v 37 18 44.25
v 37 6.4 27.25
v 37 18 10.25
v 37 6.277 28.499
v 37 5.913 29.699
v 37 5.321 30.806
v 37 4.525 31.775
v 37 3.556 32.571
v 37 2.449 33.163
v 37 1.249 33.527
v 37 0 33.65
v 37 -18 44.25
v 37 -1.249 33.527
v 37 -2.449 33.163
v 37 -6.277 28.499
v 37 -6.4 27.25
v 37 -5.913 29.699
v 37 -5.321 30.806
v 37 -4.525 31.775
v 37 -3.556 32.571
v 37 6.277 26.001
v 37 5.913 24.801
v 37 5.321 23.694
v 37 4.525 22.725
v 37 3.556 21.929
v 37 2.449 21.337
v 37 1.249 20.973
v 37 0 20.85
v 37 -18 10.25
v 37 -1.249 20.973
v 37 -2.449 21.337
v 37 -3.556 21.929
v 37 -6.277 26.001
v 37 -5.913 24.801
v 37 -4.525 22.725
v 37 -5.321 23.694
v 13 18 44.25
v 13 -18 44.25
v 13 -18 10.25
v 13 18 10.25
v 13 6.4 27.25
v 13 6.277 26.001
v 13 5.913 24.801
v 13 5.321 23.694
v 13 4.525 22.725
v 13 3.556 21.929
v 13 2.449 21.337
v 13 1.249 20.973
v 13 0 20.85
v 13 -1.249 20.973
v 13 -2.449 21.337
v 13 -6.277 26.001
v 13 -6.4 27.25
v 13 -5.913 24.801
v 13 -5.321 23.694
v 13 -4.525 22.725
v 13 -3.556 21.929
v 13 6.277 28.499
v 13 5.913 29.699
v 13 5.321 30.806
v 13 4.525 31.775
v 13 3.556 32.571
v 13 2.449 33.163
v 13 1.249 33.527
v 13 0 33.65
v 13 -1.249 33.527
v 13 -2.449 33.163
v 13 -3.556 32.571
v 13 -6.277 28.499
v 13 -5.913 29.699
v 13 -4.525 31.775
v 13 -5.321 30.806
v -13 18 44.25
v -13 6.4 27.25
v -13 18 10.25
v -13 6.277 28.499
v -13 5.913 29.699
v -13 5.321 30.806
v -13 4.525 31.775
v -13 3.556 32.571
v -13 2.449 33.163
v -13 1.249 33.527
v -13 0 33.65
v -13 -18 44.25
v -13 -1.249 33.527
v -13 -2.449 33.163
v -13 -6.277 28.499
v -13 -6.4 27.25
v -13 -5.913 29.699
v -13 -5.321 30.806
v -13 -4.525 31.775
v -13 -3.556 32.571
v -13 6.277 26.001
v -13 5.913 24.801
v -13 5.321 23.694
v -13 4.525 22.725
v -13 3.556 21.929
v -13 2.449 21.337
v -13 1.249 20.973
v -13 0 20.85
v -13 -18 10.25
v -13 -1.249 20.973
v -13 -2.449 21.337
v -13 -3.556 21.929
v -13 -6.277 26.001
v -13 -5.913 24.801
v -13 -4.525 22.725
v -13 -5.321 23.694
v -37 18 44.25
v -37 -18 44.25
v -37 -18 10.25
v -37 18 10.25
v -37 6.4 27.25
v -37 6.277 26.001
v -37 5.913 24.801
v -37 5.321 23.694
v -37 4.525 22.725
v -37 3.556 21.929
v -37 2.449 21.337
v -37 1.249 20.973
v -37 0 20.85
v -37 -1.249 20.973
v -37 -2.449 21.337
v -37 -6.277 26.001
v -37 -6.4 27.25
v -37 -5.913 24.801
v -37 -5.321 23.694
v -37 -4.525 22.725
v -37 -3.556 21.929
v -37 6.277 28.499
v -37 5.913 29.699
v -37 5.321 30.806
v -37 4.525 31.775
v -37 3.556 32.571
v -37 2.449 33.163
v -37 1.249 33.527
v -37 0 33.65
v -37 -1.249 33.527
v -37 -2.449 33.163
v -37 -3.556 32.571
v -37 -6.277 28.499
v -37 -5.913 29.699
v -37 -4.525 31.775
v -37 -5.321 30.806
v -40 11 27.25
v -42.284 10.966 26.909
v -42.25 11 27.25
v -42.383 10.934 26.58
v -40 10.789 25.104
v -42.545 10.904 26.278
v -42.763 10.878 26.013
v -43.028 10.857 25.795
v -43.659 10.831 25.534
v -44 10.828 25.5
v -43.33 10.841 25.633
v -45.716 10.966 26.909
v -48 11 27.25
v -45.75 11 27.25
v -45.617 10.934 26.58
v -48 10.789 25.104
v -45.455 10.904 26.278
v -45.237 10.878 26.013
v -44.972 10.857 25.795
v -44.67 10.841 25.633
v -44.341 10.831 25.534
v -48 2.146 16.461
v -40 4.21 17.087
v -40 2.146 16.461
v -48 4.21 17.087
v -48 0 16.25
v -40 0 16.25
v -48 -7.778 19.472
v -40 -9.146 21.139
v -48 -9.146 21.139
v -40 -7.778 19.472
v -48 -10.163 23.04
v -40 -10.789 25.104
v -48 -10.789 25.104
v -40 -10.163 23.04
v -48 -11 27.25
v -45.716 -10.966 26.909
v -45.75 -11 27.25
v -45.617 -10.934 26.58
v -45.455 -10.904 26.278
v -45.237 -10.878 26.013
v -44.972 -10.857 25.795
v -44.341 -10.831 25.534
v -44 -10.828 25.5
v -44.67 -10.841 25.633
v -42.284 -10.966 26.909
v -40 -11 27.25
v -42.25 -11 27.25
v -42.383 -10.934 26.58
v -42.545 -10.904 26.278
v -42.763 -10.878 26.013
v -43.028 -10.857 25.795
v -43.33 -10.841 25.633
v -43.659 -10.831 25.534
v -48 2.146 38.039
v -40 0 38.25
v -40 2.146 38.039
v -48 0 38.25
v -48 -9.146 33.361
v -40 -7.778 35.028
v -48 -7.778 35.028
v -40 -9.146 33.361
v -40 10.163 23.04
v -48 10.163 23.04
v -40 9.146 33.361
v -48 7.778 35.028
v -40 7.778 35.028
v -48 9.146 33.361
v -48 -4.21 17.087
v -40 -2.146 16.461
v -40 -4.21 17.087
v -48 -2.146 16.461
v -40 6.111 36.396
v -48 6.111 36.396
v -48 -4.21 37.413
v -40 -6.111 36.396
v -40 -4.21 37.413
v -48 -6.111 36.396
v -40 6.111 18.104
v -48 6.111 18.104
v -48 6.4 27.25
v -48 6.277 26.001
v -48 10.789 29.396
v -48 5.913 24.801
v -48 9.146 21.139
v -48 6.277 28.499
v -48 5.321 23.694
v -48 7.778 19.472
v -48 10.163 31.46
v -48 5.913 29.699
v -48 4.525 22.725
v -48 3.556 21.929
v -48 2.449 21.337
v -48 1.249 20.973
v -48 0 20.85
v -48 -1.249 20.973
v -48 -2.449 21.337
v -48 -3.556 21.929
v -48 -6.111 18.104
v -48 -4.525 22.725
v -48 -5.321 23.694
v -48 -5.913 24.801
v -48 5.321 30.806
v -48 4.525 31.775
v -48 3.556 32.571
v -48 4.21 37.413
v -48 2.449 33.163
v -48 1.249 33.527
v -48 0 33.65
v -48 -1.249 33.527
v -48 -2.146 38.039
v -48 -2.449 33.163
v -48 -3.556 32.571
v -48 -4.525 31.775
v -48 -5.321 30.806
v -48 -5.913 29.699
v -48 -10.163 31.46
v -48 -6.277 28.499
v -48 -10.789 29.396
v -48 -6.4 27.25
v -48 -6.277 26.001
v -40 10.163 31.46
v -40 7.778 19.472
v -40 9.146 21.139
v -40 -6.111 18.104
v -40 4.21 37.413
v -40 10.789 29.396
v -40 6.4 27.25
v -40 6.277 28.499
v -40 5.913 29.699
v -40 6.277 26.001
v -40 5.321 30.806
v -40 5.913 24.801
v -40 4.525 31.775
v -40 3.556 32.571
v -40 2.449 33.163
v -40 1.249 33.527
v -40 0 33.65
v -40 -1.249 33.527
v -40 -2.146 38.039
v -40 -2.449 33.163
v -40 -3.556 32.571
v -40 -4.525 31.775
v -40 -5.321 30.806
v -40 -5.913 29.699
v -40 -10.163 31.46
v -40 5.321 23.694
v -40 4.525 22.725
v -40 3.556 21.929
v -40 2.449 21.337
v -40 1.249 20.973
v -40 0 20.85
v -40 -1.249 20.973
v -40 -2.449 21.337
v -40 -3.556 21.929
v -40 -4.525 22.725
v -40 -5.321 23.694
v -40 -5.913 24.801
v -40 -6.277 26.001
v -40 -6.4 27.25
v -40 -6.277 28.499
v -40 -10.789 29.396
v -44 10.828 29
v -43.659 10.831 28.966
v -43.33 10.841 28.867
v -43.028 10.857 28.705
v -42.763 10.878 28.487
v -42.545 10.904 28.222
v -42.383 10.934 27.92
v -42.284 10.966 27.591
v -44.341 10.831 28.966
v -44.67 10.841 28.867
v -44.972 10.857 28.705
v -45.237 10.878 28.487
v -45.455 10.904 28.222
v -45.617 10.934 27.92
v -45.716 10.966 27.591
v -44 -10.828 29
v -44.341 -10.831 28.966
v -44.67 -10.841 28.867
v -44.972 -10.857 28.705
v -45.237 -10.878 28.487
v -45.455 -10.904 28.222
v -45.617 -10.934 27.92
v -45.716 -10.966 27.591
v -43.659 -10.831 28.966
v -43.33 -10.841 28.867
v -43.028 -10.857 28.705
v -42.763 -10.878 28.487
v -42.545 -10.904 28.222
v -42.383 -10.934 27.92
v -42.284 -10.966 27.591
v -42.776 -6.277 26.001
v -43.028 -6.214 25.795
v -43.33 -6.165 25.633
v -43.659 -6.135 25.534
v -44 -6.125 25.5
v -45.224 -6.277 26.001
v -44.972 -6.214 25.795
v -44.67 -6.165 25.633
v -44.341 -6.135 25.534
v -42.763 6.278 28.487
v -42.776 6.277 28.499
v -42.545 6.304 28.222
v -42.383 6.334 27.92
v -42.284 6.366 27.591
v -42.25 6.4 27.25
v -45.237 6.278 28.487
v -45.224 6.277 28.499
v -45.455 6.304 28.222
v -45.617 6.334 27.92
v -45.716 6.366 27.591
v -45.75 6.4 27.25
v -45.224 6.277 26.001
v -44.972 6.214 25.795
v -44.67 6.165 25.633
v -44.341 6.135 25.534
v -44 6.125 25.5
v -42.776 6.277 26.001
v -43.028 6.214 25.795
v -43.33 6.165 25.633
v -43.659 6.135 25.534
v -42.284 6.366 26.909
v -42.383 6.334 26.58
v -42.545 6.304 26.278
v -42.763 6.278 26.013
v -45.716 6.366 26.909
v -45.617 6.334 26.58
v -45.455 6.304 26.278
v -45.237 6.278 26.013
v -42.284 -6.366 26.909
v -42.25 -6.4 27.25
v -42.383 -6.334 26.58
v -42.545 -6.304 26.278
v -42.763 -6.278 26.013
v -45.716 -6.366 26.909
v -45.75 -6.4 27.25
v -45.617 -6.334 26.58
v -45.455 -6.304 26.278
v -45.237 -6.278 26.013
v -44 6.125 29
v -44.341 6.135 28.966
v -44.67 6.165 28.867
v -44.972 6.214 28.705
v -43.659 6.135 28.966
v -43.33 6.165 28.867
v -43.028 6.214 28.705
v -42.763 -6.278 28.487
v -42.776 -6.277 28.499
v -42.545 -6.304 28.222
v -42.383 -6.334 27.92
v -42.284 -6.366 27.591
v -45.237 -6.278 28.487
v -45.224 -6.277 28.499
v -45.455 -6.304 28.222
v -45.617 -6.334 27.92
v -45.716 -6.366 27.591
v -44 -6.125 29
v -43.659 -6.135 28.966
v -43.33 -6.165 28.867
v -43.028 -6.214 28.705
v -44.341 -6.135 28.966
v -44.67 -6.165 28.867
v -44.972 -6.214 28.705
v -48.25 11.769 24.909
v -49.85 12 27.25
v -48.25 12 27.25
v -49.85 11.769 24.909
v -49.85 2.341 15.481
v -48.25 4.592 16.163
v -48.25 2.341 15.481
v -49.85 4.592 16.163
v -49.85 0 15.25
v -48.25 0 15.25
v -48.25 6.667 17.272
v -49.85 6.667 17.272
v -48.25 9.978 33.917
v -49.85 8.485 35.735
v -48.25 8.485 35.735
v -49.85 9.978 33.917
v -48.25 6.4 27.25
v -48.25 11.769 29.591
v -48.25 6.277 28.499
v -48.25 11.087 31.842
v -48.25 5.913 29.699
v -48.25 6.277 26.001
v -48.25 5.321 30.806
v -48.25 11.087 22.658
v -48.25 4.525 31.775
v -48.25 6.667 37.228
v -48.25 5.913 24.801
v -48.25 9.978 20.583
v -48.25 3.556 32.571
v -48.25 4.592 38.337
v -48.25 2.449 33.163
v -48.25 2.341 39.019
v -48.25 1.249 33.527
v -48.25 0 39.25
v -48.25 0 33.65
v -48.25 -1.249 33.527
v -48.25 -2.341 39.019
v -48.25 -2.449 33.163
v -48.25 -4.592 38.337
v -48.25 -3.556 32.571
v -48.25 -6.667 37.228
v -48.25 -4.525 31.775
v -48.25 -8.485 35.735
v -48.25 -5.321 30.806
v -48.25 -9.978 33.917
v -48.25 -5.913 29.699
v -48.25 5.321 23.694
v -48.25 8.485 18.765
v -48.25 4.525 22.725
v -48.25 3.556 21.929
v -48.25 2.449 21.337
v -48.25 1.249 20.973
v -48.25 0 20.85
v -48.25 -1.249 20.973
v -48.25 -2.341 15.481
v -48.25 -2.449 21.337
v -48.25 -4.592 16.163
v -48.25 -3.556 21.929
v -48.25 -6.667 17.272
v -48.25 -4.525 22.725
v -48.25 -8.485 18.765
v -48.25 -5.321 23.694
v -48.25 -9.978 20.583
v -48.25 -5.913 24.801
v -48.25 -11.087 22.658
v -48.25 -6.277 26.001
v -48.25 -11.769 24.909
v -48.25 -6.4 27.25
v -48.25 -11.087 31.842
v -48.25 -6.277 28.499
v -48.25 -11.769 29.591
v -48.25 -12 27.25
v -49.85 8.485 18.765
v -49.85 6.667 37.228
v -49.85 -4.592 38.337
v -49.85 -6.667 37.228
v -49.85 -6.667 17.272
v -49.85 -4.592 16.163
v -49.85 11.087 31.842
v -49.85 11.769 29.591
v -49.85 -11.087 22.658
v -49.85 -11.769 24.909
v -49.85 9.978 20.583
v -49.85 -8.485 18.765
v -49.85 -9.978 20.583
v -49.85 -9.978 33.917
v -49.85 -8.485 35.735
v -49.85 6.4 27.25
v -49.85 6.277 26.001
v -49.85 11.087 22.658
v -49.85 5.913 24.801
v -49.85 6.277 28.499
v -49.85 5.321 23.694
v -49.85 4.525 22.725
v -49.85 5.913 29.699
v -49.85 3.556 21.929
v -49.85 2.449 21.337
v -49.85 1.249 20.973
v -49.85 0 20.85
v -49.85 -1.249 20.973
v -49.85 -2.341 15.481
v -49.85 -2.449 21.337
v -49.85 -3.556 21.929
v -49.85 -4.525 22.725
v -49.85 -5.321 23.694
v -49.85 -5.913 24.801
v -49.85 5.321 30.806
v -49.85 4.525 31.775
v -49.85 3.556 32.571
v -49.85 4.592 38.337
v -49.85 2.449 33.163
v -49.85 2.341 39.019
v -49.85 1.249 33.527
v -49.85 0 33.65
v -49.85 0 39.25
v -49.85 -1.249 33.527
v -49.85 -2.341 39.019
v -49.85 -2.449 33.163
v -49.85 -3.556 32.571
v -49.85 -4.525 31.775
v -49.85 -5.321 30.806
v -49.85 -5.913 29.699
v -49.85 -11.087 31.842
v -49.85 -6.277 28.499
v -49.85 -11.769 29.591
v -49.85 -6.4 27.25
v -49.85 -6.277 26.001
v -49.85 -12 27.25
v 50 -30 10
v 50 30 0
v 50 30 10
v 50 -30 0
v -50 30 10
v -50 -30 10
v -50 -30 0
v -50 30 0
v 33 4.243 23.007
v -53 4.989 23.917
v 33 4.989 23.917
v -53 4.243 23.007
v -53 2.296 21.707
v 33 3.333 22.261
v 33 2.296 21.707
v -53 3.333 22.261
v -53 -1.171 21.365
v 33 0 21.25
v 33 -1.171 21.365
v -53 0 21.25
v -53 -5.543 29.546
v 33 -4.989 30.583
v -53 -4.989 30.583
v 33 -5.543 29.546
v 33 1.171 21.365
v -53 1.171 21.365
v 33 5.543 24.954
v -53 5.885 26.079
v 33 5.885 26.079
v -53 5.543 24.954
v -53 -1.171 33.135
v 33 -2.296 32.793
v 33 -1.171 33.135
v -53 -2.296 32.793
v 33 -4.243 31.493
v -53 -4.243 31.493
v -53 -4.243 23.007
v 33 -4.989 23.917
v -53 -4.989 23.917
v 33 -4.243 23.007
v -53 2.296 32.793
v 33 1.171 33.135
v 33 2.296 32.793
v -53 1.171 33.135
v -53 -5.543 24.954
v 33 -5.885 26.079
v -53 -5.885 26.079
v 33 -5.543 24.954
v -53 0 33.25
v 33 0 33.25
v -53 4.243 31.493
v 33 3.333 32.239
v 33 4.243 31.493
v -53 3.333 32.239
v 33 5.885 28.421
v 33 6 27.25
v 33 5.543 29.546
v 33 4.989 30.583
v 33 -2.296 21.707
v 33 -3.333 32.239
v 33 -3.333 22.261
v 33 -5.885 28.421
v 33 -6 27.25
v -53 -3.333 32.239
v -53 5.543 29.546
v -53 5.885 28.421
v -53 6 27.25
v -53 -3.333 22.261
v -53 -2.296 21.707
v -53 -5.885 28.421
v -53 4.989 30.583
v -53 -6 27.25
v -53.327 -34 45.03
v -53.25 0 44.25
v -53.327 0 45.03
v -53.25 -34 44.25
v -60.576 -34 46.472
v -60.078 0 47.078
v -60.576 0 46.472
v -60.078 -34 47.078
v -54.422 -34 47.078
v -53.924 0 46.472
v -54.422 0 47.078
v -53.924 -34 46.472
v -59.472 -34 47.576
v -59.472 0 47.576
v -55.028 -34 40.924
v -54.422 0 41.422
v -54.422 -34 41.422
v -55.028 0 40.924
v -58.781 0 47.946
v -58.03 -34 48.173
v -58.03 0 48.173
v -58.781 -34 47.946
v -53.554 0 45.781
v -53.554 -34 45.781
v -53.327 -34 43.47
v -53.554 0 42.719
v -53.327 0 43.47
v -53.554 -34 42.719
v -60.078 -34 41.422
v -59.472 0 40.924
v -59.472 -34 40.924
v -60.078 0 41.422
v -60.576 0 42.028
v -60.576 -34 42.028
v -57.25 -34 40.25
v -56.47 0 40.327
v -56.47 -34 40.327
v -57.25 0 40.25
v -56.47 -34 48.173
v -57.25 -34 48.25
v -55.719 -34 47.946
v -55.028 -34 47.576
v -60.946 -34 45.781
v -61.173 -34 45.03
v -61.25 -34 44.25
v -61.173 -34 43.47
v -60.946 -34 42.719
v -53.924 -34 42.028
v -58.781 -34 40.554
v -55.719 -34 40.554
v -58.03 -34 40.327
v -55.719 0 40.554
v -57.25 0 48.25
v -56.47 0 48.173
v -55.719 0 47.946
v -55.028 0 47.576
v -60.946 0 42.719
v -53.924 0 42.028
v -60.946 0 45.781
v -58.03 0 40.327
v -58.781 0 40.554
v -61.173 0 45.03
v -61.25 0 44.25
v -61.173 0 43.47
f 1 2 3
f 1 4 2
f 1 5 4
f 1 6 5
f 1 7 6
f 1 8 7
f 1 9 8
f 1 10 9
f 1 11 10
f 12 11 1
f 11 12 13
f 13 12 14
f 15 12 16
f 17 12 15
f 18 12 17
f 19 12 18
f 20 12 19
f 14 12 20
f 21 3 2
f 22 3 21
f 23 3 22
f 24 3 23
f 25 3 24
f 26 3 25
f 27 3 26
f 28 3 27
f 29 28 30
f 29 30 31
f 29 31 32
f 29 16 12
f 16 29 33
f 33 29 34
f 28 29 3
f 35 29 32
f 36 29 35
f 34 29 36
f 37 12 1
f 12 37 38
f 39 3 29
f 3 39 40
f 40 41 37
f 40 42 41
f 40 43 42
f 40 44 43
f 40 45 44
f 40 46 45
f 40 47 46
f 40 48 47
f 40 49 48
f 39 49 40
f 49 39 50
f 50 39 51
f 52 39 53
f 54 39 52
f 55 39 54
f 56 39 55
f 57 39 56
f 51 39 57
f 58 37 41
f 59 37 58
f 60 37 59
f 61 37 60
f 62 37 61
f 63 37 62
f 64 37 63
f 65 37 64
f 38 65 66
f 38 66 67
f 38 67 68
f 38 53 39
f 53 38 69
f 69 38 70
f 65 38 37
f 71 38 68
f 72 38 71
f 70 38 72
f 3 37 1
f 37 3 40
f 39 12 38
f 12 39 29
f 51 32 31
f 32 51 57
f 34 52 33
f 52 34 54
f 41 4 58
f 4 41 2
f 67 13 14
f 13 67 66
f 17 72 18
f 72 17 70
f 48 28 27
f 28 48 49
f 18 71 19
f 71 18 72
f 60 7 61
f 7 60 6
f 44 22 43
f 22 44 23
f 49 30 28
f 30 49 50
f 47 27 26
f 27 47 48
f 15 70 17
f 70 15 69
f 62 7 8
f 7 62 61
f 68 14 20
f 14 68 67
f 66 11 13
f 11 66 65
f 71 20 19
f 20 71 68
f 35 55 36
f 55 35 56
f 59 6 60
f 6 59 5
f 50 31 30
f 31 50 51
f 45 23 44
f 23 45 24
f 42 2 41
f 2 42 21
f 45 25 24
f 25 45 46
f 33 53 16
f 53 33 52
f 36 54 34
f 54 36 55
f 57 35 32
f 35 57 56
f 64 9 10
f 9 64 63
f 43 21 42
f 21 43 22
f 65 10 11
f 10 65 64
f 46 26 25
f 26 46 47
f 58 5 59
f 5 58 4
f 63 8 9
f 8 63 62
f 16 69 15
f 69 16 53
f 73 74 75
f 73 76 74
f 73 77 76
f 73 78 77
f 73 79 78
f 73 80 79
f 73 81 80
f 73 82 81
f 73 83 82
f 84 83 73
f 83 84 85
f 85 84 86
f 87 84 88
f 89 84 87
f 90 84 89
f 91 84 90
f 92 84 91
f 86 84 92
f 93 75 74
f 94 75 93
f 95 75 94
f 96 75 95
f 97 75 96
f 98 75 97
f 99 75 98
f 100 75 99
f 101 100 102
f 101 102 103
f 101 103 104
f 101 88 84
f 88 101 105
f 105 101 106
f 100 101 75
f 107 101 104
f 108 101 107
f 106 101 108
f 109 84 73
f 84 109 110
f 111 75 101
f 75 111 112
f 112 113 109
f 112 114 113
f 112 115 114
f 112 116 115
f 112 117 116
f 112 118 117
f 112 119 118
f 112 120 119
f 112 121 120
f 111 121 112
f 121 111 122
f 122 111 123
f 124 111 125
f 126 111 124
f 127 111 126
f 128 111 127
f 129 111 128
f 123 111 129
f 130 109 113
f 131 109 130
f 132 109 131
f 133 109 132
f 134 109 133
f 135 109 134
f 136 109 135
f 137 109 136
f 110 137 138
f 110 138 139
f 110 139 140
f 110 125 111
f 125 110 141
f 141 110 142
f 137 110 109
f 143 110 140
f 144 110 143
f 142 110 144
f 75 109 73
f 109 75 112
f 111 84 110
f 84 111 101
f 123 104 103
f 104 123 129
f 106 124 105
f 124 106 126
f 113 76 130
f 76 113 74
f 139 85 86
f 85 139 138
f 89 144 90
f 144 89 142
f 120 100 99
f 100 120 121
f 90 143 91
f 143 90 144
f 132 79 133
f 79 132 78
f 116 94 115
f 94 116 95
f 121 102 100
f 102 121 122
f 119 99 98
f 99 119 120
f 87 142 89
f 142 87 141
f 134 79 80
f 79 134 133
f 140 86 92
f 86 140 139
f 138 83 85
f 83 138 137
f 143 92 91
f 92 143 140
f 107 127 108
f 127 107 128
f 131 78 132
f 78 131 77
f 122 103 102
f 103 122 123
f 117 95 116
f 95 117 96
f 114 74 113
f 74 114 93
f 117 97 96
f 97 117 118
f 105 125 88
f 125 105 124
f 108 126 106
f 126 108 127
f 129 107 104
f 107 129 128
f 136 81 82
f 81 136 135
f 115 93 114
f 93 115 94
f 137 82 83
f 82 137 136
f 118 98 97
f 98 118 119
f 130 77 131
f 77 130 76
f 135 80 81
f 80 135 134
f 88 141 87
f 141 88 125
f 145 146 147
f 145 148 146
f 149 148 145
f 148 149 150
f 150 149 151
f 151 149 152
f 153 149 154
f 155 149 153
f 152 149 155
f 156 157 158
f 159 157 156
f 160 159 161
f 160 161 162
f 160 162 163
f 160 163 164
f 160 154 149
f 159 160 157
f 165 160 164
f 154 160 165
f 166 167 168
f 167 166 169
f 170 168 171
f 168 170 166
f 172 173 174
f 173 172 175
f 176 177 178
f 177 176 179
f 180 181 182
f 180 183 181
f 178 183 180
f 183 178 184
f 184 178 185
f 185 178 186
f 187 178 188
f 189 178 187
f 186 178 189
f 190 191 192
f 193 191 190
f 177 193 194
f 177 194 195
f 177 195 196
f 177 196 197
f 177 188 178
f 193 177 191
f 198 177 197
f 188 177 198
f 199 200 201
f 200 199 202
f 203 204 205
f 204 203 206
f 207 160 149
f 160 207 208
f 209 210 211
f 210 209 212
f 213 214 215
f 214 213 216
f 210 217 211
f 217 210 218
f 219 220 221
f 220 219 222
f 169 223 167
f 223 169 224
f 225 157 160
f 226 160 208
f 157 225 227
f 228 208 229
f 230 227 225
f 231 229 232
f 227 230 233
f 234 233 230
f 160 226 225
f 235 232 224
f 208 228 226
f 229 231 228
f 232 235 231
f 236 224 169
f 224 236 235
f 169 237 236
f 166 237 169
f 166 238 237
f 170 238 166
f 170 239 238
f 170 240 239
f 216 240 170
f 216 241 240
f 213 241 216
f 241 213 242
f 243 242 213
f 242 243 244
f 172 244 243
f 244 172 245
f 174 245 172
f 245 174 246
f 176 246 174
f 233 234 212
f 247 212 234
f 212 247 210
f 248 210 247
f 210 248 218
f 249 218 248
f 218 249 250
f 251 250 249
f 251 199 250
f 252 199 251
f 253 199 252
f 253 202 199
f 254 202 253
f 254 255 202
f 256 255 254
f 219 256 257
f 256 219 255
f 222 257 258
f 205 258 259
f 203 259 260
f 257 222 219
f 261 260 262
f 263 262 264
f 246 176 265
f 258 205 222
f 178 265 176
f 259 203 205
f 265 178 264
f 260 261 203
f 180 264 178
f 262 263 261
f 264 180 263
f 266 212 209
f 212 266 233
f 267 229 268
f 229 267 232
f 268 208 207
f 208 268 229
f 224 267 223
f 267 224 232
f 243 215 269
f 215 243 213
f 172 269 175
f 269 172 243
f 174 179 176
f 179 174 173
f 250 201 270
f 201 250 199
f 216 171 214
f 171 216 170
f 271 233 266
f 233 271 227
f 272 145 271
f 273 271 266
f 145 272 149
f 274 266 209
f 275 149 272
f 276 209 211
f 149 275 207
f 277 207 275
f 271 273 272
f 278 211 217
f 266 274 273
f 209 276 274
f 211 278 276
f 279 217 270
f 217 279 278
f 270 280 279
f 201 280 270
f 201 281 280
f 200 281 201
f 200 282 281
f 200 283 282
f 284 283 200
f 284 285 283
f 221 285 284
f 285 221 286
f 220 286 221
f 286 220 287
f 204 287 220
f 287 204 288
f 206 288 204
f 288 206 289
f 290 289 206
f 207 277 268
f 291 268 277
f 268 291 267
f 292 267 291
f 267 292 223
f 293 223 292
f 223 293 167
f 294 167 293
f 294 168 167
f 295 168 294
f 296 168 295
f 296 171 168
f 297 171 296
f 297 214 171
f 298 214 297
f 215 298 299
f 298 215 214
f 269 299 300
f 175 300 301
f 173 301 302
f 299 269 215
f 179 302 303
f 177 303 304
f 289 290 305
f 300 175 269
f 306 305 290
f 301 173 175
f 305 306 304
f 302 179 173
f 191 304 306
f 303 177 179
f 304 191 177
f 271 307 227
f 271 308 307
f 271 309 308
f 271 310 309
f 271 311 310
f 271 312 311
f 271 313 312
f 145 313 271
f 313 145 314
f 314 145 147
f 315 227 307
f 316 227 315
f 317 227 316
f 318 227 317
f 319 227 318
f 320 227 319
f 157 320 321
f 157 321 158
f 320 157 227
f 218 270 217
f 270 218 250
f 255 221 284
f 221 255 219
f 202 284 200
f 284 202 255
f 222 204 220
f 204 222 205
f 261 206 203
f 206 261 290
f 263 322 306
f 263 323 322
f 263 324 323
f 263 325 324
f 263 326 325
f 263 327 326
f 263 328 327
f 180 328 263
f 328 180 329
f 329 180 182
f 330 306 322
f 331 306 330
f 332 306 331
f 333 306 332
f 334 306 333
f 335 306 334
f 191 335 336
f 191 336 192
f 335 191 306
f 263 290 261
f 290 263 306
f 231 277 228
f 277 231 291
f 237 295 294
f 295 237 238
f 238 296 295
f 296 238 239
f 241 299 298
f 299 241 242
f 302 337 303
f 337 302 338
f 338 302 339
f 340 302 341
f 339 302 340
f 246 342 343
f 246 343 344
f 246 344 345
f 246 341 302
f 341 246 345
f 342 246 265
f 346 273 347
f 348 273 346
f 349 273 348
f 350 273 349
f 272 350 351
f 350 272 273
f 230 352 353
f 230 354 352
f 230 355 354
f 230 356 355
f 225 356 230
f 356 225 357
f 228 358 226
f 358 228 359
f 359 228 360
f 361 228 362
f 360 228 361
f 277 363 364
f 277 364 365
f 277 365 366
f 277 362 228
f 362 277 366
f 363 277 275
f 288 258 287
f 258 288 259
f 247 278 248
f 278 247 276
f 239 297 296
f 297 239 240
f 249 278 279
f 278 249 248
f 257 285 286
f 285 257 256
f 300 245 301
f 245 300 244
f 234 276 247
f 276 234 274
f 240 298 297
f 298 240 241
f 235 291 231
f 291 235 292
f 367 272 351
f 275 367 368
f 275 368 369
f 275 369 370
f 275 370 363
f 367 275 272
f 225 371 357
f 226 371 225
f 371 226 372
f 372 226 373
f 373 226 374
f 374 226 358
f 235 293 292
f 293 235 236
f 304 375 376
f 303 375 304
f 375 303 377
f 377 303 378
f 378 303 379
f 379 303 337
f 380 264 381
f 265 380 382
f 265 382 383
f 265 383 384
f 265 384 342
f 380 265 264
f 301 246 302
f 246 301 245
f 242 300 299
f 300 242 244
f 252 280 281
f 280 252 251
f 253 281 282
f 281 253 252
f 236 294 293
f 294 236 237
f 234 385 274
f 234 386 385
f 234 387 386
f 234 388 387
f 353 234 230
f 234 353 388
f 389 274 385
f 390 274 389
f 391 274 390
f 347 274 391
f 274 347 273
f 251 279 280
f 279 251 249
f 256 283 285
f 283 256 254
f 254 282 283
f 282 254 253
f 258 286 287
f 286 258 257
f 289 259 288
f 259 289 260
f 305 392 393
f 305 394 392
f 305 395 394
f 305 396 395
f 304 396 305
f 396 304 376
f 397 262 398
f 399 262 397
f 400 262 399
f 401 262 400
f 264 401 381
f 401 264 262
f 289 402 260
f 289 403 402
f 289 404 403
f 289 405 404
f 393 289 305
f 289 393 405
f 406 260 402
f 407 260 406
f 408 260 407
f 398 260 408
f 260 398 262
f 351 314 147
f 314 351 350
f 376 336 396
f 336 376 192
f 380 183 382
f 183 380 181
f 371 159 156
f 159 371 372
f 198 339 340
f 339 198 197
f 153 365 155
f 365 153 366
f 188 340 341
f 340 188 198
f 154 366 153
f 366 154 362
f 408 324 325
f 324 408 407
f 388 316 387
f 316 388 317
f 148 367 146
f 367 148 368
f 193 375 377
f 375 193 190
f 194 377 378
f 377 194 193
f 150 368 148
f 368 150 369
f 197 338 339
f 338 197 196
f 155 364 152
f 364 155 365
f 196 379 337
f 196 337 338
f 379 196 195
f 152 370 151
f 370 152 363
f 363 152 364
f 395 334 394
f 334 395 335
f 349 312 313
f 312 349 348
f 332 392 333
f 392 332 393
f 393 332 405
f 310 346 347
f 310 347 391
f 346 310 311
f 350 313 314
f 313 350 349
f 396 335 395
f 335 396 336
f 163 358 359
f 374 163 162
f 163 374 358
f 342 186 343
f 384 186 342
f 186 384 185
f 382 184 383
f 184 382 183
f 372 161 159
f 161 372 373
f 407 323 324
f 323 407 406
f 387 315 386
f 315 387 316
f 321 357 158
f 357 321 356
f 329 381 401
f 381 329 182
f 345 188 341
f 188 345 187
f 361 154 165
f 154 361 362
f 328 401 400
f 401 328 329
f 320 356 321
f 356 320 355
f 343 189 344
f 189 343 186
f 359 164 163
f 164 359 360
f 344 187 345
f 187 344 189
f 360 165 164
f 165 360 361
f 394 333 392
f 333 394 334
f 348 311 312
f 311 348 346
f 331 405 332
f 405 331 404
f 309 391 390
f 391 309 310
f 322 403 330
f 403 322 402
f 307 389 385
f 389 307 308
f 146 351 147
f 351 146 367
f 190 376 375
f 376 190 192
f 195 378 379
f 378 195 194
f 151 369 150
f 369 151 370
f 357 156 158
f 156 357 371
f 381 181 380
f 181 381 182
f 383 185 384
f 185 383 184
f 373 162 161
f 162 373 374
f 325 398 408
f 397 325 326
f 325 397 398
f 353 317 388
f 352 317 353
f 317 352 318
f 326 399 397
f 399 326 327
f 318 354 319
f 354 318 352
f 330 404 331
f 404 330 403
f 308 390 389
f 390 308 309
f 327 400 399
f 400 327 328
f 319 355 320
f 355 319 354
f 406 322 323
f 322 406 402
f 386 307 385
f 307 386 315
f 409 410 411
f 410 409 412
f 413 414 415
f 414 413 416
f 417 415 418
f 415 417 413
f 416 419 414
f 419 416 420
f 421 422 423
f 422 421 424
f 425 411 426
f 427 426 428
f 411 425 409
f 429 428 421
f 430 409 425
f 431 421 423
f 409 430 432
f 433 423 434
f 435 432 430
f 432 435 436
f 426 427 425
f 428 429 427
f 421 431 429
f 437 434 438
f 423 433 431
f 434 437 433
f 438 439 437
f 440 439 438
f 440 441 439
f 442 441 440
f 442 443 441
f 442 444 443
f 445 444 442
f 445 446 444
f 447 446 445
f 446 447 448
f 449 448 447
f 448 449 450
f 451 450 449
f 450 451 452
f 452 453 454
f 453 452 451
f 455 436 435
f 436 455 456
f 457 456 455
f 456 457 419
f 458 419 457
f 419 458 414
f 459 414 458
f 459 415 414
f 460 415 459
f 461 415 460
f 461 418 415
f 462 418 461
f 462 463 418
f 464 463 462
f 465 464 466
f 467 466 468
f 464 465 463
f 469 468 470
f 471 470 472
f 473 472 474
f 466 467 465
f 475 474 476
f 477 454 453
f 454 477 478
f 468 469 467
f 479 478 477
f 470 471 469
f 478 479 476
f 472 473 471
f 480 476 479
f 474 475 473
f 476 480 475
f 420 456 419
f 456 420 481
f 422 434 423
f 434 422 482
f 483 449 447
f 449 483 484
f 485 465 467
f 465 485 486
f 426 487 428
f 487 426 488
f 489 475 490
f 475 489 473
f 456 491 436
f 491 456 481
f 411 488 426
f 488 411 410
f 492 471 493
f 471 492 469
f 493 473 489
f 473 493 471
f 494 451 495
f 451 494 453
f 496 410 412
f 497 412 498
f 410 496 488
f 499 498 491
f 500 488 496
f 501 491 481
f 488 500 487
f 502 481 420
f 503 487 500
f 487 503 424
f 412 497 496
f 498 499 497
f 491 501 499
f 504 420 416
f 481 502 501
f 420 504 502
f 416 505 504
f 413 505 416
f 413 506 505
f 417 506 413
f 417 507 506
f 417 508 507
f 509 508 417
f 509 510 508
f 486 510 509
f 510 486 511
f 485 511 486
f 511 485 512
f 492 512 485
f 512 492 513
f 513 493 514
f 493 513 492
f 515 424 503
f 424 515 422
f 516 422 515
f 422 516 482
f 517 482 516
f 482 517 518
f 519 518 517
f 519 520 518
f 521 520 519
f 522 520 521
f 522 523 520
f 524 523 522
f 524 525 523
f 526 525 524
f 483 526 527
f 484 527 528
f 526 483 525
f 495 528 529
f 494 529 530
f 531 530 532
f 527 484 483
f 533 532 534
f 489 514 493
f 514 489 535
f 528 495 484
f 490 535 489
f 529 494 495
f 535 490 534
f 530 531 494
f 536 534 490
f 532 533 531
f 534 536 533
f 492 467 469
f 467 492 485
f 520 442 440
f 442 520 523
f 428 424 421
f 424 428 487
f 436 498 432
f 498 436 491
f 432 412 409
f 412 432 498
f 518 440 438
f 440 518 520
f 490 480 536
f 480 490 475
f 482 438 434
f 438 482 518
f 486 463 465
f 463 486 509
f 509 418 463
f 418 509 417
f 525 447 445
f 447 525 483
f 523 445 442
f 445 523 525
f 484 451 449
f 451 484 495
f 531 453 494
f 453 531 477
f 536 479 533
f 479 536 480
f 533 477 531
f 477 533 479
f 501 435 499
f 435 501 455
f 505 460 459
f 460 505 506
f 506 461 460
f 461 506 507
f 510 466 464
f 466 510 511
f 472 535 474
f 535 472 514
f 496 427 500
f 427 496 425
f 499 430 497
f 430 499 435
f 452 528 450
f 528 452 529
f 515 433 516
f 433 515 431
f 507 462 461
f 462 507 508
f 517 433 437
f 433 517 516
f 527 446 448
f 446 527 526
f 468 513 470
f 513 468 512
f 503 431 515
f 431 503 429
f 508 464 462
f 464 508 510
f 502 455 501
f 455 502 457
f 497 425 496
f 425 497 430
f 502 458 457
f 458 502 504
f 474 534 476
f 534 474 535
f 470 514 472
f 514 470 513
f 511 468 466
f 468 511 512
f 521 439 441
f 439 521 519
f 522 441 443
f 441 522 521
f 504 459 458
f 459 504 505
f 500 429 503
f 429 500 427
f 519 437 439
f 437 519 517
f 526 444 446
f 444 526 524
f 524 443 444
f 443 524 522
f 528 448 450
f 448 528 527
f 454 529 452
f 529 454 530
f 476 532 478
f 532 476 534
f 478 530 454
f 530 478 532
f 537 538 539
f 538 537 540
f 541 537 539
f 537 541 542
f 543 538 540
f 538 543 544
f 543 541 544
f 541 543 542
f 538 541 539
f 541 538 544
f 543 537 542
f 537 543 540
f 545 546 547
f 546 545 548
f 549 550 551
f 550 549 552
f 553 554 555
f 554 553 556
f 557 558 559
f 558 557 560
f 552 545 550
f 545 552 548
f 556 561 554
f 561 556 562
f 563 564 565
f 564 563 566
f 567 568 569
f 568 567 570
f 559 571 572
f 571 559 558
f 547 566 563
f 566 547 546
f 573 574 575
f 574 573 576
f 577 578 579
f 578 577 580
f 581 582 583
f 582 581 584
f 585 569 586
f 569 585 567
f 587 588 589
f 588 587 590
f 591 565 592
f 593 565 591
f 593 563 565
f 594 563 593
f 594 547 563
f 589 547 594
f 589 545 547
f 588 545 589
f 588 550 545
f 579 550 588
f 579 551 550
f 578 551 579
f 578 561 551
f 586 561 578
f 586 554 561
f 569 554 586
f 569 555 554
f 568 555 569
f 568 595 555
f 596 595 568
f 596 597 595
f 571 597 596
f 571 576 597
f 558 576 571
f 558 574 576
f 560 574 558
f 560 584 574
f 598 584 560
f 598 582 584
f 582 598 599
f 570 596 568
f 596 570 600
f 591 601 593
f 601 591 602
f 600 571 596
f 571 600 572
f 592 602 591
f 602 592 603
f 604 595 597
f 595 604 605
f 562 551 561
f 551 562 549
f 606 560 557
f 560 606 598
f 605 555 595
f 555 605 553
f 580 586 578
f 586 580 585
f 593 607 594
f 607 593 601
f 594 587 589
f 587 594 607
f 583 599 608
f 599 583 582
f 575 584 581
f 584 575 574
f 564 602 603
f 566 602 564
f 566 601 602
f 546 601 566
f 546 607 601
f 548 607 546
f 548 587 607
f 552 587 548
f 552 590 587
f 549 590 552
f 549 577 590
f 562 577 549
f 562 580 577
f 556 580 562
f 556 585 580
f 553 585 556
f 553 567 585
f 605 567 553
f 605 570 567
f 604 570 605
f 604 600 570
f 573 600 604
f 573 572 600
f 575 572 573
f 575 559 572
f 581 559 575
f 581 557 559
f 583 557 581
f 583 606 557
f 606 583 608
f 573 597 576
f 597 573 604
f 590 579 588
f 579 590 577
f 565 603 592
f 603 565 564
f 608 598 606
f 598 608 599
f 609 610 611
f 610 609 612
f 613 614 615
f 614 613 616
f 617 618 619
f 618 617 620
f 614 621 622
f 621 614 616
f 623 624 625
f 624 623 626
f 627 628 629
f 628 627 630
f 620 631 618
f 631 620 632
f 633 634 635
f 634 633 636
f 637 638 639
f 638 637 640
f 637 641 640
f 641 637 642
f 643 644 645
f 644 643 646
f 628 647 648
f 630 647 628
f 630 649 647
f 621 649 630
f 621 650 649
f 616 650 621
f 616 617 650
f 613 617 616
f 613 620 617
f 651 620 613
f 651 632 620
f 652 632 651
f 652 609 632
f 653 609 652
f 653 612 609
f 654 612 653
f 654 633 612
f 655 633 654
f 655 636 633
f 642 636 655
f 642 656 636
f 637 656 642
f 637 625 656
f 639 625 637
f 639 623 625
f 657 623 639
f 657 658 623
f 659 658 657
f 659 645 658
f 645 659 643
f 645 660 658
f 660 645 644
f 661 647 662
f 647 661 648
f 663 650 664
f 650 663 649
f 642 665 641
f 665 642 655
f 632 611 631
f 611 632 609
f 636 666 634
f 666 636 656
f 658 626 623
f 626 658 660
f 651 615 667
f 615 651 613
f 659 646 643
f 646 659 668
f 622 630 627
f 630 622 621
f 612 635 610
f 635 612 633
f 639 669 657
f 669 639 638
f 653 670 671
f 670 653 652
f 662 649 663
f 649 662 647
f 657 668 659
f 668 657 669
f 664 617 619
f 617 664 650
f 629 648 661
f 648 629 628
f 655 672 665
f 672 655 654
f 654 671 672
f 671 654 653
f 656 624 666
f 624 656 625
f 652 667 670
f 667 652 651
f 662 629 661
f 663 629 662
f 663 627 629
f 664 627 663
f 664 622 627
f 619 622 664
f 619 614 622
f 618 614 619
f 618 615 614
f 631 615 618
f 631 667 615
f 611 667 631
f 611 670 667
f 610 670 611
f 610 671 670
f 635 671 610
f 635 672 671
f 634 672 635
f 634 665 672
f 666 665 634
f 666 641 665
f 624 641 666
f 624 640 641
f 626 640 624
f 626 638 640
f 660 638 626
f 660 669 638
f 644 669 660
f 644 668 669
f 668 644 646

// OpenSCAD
$fn = 32;

// ------------------------------------------------------------------------
// Machine vise: screw d12, jaws 24 x 34 mm
// Every part is its own module, assembly() places every instance.
// ------------------------------------------------------------------------

// --- part 1 ---
module vise_bed() {
  difference() {
    translate([-50, -30, 0]) cube([100, 60, 10]);
  }
}

// --- part 2 ---
module vise_jaw() {
  difference() {
    translate([-12, -18, 0]) cube([24, 36, 34]);
    translate([0, 0, 17]) rotate([0, 90, 0]) cylinder(h = 26, d = 12.8, center = true);
  }
}

// --- part 3 ---
module vise_screw() {
  translate([0, 0, -43]) cylinder(h = 86, d = 12);
}

// --- part 4 ---
module screw_collar() {
  difference() {
    cylinder(h = 8, d = 22);
    translate([0, 0, -1]) cylinder(h = 10, d = 12.8);
    translate([0, 0, 4]) rotate([90, 0, 0]) cylinder(h = 24, d = 3.5, center = true);
  }
}

// --- part 5 ---
module screw_washer() {
  difference() {
      translate([0, 0, 0]) cylinder(h = 1.6, d = 24);
      translate([0, 0, -1]) cylinder(h = 3.6, d = 12.8);
    }
}

// --- part 6 ---
module vise_handle() {
  cylinder(h = 34, d = 8);
}

// --- assembly ---
module assembly() {
  color([0.80, 0.24, 0.20]) translate([0, 0, 0]) rotate([0, 0, 0]) vise_bed();
  color([0.20, 0.45, 0.75]) translate([25, 0, 10.25]) rotate([0, 0, 0]) vise_jaw();
  color([0.25, 0.62, 0.32]) translate([-25, 0, 10.25]) rotate([0, 0, 0]) vise_jaw();
  color([0.92, 0.70, 0.18]) translate([-10, 0, 27.25]) rotate([0, 90, 0]) vise_screw();
  color([0.58, 0.35, 0.70]) translate([-48, 0, 27.25]) rotate([0, 90, 0]) screw_collar();
  color([0.16, 0.66, 0.66]) translate([-49.85, 0, 27.25]) rotate([0, 90, 0]) screw_washer();
  color([0.85, 0.48, 0.18]) translate([-57.25, 0, 44.25]) rotate([90, 0, 0]) vise_handle();
}

assembly();
